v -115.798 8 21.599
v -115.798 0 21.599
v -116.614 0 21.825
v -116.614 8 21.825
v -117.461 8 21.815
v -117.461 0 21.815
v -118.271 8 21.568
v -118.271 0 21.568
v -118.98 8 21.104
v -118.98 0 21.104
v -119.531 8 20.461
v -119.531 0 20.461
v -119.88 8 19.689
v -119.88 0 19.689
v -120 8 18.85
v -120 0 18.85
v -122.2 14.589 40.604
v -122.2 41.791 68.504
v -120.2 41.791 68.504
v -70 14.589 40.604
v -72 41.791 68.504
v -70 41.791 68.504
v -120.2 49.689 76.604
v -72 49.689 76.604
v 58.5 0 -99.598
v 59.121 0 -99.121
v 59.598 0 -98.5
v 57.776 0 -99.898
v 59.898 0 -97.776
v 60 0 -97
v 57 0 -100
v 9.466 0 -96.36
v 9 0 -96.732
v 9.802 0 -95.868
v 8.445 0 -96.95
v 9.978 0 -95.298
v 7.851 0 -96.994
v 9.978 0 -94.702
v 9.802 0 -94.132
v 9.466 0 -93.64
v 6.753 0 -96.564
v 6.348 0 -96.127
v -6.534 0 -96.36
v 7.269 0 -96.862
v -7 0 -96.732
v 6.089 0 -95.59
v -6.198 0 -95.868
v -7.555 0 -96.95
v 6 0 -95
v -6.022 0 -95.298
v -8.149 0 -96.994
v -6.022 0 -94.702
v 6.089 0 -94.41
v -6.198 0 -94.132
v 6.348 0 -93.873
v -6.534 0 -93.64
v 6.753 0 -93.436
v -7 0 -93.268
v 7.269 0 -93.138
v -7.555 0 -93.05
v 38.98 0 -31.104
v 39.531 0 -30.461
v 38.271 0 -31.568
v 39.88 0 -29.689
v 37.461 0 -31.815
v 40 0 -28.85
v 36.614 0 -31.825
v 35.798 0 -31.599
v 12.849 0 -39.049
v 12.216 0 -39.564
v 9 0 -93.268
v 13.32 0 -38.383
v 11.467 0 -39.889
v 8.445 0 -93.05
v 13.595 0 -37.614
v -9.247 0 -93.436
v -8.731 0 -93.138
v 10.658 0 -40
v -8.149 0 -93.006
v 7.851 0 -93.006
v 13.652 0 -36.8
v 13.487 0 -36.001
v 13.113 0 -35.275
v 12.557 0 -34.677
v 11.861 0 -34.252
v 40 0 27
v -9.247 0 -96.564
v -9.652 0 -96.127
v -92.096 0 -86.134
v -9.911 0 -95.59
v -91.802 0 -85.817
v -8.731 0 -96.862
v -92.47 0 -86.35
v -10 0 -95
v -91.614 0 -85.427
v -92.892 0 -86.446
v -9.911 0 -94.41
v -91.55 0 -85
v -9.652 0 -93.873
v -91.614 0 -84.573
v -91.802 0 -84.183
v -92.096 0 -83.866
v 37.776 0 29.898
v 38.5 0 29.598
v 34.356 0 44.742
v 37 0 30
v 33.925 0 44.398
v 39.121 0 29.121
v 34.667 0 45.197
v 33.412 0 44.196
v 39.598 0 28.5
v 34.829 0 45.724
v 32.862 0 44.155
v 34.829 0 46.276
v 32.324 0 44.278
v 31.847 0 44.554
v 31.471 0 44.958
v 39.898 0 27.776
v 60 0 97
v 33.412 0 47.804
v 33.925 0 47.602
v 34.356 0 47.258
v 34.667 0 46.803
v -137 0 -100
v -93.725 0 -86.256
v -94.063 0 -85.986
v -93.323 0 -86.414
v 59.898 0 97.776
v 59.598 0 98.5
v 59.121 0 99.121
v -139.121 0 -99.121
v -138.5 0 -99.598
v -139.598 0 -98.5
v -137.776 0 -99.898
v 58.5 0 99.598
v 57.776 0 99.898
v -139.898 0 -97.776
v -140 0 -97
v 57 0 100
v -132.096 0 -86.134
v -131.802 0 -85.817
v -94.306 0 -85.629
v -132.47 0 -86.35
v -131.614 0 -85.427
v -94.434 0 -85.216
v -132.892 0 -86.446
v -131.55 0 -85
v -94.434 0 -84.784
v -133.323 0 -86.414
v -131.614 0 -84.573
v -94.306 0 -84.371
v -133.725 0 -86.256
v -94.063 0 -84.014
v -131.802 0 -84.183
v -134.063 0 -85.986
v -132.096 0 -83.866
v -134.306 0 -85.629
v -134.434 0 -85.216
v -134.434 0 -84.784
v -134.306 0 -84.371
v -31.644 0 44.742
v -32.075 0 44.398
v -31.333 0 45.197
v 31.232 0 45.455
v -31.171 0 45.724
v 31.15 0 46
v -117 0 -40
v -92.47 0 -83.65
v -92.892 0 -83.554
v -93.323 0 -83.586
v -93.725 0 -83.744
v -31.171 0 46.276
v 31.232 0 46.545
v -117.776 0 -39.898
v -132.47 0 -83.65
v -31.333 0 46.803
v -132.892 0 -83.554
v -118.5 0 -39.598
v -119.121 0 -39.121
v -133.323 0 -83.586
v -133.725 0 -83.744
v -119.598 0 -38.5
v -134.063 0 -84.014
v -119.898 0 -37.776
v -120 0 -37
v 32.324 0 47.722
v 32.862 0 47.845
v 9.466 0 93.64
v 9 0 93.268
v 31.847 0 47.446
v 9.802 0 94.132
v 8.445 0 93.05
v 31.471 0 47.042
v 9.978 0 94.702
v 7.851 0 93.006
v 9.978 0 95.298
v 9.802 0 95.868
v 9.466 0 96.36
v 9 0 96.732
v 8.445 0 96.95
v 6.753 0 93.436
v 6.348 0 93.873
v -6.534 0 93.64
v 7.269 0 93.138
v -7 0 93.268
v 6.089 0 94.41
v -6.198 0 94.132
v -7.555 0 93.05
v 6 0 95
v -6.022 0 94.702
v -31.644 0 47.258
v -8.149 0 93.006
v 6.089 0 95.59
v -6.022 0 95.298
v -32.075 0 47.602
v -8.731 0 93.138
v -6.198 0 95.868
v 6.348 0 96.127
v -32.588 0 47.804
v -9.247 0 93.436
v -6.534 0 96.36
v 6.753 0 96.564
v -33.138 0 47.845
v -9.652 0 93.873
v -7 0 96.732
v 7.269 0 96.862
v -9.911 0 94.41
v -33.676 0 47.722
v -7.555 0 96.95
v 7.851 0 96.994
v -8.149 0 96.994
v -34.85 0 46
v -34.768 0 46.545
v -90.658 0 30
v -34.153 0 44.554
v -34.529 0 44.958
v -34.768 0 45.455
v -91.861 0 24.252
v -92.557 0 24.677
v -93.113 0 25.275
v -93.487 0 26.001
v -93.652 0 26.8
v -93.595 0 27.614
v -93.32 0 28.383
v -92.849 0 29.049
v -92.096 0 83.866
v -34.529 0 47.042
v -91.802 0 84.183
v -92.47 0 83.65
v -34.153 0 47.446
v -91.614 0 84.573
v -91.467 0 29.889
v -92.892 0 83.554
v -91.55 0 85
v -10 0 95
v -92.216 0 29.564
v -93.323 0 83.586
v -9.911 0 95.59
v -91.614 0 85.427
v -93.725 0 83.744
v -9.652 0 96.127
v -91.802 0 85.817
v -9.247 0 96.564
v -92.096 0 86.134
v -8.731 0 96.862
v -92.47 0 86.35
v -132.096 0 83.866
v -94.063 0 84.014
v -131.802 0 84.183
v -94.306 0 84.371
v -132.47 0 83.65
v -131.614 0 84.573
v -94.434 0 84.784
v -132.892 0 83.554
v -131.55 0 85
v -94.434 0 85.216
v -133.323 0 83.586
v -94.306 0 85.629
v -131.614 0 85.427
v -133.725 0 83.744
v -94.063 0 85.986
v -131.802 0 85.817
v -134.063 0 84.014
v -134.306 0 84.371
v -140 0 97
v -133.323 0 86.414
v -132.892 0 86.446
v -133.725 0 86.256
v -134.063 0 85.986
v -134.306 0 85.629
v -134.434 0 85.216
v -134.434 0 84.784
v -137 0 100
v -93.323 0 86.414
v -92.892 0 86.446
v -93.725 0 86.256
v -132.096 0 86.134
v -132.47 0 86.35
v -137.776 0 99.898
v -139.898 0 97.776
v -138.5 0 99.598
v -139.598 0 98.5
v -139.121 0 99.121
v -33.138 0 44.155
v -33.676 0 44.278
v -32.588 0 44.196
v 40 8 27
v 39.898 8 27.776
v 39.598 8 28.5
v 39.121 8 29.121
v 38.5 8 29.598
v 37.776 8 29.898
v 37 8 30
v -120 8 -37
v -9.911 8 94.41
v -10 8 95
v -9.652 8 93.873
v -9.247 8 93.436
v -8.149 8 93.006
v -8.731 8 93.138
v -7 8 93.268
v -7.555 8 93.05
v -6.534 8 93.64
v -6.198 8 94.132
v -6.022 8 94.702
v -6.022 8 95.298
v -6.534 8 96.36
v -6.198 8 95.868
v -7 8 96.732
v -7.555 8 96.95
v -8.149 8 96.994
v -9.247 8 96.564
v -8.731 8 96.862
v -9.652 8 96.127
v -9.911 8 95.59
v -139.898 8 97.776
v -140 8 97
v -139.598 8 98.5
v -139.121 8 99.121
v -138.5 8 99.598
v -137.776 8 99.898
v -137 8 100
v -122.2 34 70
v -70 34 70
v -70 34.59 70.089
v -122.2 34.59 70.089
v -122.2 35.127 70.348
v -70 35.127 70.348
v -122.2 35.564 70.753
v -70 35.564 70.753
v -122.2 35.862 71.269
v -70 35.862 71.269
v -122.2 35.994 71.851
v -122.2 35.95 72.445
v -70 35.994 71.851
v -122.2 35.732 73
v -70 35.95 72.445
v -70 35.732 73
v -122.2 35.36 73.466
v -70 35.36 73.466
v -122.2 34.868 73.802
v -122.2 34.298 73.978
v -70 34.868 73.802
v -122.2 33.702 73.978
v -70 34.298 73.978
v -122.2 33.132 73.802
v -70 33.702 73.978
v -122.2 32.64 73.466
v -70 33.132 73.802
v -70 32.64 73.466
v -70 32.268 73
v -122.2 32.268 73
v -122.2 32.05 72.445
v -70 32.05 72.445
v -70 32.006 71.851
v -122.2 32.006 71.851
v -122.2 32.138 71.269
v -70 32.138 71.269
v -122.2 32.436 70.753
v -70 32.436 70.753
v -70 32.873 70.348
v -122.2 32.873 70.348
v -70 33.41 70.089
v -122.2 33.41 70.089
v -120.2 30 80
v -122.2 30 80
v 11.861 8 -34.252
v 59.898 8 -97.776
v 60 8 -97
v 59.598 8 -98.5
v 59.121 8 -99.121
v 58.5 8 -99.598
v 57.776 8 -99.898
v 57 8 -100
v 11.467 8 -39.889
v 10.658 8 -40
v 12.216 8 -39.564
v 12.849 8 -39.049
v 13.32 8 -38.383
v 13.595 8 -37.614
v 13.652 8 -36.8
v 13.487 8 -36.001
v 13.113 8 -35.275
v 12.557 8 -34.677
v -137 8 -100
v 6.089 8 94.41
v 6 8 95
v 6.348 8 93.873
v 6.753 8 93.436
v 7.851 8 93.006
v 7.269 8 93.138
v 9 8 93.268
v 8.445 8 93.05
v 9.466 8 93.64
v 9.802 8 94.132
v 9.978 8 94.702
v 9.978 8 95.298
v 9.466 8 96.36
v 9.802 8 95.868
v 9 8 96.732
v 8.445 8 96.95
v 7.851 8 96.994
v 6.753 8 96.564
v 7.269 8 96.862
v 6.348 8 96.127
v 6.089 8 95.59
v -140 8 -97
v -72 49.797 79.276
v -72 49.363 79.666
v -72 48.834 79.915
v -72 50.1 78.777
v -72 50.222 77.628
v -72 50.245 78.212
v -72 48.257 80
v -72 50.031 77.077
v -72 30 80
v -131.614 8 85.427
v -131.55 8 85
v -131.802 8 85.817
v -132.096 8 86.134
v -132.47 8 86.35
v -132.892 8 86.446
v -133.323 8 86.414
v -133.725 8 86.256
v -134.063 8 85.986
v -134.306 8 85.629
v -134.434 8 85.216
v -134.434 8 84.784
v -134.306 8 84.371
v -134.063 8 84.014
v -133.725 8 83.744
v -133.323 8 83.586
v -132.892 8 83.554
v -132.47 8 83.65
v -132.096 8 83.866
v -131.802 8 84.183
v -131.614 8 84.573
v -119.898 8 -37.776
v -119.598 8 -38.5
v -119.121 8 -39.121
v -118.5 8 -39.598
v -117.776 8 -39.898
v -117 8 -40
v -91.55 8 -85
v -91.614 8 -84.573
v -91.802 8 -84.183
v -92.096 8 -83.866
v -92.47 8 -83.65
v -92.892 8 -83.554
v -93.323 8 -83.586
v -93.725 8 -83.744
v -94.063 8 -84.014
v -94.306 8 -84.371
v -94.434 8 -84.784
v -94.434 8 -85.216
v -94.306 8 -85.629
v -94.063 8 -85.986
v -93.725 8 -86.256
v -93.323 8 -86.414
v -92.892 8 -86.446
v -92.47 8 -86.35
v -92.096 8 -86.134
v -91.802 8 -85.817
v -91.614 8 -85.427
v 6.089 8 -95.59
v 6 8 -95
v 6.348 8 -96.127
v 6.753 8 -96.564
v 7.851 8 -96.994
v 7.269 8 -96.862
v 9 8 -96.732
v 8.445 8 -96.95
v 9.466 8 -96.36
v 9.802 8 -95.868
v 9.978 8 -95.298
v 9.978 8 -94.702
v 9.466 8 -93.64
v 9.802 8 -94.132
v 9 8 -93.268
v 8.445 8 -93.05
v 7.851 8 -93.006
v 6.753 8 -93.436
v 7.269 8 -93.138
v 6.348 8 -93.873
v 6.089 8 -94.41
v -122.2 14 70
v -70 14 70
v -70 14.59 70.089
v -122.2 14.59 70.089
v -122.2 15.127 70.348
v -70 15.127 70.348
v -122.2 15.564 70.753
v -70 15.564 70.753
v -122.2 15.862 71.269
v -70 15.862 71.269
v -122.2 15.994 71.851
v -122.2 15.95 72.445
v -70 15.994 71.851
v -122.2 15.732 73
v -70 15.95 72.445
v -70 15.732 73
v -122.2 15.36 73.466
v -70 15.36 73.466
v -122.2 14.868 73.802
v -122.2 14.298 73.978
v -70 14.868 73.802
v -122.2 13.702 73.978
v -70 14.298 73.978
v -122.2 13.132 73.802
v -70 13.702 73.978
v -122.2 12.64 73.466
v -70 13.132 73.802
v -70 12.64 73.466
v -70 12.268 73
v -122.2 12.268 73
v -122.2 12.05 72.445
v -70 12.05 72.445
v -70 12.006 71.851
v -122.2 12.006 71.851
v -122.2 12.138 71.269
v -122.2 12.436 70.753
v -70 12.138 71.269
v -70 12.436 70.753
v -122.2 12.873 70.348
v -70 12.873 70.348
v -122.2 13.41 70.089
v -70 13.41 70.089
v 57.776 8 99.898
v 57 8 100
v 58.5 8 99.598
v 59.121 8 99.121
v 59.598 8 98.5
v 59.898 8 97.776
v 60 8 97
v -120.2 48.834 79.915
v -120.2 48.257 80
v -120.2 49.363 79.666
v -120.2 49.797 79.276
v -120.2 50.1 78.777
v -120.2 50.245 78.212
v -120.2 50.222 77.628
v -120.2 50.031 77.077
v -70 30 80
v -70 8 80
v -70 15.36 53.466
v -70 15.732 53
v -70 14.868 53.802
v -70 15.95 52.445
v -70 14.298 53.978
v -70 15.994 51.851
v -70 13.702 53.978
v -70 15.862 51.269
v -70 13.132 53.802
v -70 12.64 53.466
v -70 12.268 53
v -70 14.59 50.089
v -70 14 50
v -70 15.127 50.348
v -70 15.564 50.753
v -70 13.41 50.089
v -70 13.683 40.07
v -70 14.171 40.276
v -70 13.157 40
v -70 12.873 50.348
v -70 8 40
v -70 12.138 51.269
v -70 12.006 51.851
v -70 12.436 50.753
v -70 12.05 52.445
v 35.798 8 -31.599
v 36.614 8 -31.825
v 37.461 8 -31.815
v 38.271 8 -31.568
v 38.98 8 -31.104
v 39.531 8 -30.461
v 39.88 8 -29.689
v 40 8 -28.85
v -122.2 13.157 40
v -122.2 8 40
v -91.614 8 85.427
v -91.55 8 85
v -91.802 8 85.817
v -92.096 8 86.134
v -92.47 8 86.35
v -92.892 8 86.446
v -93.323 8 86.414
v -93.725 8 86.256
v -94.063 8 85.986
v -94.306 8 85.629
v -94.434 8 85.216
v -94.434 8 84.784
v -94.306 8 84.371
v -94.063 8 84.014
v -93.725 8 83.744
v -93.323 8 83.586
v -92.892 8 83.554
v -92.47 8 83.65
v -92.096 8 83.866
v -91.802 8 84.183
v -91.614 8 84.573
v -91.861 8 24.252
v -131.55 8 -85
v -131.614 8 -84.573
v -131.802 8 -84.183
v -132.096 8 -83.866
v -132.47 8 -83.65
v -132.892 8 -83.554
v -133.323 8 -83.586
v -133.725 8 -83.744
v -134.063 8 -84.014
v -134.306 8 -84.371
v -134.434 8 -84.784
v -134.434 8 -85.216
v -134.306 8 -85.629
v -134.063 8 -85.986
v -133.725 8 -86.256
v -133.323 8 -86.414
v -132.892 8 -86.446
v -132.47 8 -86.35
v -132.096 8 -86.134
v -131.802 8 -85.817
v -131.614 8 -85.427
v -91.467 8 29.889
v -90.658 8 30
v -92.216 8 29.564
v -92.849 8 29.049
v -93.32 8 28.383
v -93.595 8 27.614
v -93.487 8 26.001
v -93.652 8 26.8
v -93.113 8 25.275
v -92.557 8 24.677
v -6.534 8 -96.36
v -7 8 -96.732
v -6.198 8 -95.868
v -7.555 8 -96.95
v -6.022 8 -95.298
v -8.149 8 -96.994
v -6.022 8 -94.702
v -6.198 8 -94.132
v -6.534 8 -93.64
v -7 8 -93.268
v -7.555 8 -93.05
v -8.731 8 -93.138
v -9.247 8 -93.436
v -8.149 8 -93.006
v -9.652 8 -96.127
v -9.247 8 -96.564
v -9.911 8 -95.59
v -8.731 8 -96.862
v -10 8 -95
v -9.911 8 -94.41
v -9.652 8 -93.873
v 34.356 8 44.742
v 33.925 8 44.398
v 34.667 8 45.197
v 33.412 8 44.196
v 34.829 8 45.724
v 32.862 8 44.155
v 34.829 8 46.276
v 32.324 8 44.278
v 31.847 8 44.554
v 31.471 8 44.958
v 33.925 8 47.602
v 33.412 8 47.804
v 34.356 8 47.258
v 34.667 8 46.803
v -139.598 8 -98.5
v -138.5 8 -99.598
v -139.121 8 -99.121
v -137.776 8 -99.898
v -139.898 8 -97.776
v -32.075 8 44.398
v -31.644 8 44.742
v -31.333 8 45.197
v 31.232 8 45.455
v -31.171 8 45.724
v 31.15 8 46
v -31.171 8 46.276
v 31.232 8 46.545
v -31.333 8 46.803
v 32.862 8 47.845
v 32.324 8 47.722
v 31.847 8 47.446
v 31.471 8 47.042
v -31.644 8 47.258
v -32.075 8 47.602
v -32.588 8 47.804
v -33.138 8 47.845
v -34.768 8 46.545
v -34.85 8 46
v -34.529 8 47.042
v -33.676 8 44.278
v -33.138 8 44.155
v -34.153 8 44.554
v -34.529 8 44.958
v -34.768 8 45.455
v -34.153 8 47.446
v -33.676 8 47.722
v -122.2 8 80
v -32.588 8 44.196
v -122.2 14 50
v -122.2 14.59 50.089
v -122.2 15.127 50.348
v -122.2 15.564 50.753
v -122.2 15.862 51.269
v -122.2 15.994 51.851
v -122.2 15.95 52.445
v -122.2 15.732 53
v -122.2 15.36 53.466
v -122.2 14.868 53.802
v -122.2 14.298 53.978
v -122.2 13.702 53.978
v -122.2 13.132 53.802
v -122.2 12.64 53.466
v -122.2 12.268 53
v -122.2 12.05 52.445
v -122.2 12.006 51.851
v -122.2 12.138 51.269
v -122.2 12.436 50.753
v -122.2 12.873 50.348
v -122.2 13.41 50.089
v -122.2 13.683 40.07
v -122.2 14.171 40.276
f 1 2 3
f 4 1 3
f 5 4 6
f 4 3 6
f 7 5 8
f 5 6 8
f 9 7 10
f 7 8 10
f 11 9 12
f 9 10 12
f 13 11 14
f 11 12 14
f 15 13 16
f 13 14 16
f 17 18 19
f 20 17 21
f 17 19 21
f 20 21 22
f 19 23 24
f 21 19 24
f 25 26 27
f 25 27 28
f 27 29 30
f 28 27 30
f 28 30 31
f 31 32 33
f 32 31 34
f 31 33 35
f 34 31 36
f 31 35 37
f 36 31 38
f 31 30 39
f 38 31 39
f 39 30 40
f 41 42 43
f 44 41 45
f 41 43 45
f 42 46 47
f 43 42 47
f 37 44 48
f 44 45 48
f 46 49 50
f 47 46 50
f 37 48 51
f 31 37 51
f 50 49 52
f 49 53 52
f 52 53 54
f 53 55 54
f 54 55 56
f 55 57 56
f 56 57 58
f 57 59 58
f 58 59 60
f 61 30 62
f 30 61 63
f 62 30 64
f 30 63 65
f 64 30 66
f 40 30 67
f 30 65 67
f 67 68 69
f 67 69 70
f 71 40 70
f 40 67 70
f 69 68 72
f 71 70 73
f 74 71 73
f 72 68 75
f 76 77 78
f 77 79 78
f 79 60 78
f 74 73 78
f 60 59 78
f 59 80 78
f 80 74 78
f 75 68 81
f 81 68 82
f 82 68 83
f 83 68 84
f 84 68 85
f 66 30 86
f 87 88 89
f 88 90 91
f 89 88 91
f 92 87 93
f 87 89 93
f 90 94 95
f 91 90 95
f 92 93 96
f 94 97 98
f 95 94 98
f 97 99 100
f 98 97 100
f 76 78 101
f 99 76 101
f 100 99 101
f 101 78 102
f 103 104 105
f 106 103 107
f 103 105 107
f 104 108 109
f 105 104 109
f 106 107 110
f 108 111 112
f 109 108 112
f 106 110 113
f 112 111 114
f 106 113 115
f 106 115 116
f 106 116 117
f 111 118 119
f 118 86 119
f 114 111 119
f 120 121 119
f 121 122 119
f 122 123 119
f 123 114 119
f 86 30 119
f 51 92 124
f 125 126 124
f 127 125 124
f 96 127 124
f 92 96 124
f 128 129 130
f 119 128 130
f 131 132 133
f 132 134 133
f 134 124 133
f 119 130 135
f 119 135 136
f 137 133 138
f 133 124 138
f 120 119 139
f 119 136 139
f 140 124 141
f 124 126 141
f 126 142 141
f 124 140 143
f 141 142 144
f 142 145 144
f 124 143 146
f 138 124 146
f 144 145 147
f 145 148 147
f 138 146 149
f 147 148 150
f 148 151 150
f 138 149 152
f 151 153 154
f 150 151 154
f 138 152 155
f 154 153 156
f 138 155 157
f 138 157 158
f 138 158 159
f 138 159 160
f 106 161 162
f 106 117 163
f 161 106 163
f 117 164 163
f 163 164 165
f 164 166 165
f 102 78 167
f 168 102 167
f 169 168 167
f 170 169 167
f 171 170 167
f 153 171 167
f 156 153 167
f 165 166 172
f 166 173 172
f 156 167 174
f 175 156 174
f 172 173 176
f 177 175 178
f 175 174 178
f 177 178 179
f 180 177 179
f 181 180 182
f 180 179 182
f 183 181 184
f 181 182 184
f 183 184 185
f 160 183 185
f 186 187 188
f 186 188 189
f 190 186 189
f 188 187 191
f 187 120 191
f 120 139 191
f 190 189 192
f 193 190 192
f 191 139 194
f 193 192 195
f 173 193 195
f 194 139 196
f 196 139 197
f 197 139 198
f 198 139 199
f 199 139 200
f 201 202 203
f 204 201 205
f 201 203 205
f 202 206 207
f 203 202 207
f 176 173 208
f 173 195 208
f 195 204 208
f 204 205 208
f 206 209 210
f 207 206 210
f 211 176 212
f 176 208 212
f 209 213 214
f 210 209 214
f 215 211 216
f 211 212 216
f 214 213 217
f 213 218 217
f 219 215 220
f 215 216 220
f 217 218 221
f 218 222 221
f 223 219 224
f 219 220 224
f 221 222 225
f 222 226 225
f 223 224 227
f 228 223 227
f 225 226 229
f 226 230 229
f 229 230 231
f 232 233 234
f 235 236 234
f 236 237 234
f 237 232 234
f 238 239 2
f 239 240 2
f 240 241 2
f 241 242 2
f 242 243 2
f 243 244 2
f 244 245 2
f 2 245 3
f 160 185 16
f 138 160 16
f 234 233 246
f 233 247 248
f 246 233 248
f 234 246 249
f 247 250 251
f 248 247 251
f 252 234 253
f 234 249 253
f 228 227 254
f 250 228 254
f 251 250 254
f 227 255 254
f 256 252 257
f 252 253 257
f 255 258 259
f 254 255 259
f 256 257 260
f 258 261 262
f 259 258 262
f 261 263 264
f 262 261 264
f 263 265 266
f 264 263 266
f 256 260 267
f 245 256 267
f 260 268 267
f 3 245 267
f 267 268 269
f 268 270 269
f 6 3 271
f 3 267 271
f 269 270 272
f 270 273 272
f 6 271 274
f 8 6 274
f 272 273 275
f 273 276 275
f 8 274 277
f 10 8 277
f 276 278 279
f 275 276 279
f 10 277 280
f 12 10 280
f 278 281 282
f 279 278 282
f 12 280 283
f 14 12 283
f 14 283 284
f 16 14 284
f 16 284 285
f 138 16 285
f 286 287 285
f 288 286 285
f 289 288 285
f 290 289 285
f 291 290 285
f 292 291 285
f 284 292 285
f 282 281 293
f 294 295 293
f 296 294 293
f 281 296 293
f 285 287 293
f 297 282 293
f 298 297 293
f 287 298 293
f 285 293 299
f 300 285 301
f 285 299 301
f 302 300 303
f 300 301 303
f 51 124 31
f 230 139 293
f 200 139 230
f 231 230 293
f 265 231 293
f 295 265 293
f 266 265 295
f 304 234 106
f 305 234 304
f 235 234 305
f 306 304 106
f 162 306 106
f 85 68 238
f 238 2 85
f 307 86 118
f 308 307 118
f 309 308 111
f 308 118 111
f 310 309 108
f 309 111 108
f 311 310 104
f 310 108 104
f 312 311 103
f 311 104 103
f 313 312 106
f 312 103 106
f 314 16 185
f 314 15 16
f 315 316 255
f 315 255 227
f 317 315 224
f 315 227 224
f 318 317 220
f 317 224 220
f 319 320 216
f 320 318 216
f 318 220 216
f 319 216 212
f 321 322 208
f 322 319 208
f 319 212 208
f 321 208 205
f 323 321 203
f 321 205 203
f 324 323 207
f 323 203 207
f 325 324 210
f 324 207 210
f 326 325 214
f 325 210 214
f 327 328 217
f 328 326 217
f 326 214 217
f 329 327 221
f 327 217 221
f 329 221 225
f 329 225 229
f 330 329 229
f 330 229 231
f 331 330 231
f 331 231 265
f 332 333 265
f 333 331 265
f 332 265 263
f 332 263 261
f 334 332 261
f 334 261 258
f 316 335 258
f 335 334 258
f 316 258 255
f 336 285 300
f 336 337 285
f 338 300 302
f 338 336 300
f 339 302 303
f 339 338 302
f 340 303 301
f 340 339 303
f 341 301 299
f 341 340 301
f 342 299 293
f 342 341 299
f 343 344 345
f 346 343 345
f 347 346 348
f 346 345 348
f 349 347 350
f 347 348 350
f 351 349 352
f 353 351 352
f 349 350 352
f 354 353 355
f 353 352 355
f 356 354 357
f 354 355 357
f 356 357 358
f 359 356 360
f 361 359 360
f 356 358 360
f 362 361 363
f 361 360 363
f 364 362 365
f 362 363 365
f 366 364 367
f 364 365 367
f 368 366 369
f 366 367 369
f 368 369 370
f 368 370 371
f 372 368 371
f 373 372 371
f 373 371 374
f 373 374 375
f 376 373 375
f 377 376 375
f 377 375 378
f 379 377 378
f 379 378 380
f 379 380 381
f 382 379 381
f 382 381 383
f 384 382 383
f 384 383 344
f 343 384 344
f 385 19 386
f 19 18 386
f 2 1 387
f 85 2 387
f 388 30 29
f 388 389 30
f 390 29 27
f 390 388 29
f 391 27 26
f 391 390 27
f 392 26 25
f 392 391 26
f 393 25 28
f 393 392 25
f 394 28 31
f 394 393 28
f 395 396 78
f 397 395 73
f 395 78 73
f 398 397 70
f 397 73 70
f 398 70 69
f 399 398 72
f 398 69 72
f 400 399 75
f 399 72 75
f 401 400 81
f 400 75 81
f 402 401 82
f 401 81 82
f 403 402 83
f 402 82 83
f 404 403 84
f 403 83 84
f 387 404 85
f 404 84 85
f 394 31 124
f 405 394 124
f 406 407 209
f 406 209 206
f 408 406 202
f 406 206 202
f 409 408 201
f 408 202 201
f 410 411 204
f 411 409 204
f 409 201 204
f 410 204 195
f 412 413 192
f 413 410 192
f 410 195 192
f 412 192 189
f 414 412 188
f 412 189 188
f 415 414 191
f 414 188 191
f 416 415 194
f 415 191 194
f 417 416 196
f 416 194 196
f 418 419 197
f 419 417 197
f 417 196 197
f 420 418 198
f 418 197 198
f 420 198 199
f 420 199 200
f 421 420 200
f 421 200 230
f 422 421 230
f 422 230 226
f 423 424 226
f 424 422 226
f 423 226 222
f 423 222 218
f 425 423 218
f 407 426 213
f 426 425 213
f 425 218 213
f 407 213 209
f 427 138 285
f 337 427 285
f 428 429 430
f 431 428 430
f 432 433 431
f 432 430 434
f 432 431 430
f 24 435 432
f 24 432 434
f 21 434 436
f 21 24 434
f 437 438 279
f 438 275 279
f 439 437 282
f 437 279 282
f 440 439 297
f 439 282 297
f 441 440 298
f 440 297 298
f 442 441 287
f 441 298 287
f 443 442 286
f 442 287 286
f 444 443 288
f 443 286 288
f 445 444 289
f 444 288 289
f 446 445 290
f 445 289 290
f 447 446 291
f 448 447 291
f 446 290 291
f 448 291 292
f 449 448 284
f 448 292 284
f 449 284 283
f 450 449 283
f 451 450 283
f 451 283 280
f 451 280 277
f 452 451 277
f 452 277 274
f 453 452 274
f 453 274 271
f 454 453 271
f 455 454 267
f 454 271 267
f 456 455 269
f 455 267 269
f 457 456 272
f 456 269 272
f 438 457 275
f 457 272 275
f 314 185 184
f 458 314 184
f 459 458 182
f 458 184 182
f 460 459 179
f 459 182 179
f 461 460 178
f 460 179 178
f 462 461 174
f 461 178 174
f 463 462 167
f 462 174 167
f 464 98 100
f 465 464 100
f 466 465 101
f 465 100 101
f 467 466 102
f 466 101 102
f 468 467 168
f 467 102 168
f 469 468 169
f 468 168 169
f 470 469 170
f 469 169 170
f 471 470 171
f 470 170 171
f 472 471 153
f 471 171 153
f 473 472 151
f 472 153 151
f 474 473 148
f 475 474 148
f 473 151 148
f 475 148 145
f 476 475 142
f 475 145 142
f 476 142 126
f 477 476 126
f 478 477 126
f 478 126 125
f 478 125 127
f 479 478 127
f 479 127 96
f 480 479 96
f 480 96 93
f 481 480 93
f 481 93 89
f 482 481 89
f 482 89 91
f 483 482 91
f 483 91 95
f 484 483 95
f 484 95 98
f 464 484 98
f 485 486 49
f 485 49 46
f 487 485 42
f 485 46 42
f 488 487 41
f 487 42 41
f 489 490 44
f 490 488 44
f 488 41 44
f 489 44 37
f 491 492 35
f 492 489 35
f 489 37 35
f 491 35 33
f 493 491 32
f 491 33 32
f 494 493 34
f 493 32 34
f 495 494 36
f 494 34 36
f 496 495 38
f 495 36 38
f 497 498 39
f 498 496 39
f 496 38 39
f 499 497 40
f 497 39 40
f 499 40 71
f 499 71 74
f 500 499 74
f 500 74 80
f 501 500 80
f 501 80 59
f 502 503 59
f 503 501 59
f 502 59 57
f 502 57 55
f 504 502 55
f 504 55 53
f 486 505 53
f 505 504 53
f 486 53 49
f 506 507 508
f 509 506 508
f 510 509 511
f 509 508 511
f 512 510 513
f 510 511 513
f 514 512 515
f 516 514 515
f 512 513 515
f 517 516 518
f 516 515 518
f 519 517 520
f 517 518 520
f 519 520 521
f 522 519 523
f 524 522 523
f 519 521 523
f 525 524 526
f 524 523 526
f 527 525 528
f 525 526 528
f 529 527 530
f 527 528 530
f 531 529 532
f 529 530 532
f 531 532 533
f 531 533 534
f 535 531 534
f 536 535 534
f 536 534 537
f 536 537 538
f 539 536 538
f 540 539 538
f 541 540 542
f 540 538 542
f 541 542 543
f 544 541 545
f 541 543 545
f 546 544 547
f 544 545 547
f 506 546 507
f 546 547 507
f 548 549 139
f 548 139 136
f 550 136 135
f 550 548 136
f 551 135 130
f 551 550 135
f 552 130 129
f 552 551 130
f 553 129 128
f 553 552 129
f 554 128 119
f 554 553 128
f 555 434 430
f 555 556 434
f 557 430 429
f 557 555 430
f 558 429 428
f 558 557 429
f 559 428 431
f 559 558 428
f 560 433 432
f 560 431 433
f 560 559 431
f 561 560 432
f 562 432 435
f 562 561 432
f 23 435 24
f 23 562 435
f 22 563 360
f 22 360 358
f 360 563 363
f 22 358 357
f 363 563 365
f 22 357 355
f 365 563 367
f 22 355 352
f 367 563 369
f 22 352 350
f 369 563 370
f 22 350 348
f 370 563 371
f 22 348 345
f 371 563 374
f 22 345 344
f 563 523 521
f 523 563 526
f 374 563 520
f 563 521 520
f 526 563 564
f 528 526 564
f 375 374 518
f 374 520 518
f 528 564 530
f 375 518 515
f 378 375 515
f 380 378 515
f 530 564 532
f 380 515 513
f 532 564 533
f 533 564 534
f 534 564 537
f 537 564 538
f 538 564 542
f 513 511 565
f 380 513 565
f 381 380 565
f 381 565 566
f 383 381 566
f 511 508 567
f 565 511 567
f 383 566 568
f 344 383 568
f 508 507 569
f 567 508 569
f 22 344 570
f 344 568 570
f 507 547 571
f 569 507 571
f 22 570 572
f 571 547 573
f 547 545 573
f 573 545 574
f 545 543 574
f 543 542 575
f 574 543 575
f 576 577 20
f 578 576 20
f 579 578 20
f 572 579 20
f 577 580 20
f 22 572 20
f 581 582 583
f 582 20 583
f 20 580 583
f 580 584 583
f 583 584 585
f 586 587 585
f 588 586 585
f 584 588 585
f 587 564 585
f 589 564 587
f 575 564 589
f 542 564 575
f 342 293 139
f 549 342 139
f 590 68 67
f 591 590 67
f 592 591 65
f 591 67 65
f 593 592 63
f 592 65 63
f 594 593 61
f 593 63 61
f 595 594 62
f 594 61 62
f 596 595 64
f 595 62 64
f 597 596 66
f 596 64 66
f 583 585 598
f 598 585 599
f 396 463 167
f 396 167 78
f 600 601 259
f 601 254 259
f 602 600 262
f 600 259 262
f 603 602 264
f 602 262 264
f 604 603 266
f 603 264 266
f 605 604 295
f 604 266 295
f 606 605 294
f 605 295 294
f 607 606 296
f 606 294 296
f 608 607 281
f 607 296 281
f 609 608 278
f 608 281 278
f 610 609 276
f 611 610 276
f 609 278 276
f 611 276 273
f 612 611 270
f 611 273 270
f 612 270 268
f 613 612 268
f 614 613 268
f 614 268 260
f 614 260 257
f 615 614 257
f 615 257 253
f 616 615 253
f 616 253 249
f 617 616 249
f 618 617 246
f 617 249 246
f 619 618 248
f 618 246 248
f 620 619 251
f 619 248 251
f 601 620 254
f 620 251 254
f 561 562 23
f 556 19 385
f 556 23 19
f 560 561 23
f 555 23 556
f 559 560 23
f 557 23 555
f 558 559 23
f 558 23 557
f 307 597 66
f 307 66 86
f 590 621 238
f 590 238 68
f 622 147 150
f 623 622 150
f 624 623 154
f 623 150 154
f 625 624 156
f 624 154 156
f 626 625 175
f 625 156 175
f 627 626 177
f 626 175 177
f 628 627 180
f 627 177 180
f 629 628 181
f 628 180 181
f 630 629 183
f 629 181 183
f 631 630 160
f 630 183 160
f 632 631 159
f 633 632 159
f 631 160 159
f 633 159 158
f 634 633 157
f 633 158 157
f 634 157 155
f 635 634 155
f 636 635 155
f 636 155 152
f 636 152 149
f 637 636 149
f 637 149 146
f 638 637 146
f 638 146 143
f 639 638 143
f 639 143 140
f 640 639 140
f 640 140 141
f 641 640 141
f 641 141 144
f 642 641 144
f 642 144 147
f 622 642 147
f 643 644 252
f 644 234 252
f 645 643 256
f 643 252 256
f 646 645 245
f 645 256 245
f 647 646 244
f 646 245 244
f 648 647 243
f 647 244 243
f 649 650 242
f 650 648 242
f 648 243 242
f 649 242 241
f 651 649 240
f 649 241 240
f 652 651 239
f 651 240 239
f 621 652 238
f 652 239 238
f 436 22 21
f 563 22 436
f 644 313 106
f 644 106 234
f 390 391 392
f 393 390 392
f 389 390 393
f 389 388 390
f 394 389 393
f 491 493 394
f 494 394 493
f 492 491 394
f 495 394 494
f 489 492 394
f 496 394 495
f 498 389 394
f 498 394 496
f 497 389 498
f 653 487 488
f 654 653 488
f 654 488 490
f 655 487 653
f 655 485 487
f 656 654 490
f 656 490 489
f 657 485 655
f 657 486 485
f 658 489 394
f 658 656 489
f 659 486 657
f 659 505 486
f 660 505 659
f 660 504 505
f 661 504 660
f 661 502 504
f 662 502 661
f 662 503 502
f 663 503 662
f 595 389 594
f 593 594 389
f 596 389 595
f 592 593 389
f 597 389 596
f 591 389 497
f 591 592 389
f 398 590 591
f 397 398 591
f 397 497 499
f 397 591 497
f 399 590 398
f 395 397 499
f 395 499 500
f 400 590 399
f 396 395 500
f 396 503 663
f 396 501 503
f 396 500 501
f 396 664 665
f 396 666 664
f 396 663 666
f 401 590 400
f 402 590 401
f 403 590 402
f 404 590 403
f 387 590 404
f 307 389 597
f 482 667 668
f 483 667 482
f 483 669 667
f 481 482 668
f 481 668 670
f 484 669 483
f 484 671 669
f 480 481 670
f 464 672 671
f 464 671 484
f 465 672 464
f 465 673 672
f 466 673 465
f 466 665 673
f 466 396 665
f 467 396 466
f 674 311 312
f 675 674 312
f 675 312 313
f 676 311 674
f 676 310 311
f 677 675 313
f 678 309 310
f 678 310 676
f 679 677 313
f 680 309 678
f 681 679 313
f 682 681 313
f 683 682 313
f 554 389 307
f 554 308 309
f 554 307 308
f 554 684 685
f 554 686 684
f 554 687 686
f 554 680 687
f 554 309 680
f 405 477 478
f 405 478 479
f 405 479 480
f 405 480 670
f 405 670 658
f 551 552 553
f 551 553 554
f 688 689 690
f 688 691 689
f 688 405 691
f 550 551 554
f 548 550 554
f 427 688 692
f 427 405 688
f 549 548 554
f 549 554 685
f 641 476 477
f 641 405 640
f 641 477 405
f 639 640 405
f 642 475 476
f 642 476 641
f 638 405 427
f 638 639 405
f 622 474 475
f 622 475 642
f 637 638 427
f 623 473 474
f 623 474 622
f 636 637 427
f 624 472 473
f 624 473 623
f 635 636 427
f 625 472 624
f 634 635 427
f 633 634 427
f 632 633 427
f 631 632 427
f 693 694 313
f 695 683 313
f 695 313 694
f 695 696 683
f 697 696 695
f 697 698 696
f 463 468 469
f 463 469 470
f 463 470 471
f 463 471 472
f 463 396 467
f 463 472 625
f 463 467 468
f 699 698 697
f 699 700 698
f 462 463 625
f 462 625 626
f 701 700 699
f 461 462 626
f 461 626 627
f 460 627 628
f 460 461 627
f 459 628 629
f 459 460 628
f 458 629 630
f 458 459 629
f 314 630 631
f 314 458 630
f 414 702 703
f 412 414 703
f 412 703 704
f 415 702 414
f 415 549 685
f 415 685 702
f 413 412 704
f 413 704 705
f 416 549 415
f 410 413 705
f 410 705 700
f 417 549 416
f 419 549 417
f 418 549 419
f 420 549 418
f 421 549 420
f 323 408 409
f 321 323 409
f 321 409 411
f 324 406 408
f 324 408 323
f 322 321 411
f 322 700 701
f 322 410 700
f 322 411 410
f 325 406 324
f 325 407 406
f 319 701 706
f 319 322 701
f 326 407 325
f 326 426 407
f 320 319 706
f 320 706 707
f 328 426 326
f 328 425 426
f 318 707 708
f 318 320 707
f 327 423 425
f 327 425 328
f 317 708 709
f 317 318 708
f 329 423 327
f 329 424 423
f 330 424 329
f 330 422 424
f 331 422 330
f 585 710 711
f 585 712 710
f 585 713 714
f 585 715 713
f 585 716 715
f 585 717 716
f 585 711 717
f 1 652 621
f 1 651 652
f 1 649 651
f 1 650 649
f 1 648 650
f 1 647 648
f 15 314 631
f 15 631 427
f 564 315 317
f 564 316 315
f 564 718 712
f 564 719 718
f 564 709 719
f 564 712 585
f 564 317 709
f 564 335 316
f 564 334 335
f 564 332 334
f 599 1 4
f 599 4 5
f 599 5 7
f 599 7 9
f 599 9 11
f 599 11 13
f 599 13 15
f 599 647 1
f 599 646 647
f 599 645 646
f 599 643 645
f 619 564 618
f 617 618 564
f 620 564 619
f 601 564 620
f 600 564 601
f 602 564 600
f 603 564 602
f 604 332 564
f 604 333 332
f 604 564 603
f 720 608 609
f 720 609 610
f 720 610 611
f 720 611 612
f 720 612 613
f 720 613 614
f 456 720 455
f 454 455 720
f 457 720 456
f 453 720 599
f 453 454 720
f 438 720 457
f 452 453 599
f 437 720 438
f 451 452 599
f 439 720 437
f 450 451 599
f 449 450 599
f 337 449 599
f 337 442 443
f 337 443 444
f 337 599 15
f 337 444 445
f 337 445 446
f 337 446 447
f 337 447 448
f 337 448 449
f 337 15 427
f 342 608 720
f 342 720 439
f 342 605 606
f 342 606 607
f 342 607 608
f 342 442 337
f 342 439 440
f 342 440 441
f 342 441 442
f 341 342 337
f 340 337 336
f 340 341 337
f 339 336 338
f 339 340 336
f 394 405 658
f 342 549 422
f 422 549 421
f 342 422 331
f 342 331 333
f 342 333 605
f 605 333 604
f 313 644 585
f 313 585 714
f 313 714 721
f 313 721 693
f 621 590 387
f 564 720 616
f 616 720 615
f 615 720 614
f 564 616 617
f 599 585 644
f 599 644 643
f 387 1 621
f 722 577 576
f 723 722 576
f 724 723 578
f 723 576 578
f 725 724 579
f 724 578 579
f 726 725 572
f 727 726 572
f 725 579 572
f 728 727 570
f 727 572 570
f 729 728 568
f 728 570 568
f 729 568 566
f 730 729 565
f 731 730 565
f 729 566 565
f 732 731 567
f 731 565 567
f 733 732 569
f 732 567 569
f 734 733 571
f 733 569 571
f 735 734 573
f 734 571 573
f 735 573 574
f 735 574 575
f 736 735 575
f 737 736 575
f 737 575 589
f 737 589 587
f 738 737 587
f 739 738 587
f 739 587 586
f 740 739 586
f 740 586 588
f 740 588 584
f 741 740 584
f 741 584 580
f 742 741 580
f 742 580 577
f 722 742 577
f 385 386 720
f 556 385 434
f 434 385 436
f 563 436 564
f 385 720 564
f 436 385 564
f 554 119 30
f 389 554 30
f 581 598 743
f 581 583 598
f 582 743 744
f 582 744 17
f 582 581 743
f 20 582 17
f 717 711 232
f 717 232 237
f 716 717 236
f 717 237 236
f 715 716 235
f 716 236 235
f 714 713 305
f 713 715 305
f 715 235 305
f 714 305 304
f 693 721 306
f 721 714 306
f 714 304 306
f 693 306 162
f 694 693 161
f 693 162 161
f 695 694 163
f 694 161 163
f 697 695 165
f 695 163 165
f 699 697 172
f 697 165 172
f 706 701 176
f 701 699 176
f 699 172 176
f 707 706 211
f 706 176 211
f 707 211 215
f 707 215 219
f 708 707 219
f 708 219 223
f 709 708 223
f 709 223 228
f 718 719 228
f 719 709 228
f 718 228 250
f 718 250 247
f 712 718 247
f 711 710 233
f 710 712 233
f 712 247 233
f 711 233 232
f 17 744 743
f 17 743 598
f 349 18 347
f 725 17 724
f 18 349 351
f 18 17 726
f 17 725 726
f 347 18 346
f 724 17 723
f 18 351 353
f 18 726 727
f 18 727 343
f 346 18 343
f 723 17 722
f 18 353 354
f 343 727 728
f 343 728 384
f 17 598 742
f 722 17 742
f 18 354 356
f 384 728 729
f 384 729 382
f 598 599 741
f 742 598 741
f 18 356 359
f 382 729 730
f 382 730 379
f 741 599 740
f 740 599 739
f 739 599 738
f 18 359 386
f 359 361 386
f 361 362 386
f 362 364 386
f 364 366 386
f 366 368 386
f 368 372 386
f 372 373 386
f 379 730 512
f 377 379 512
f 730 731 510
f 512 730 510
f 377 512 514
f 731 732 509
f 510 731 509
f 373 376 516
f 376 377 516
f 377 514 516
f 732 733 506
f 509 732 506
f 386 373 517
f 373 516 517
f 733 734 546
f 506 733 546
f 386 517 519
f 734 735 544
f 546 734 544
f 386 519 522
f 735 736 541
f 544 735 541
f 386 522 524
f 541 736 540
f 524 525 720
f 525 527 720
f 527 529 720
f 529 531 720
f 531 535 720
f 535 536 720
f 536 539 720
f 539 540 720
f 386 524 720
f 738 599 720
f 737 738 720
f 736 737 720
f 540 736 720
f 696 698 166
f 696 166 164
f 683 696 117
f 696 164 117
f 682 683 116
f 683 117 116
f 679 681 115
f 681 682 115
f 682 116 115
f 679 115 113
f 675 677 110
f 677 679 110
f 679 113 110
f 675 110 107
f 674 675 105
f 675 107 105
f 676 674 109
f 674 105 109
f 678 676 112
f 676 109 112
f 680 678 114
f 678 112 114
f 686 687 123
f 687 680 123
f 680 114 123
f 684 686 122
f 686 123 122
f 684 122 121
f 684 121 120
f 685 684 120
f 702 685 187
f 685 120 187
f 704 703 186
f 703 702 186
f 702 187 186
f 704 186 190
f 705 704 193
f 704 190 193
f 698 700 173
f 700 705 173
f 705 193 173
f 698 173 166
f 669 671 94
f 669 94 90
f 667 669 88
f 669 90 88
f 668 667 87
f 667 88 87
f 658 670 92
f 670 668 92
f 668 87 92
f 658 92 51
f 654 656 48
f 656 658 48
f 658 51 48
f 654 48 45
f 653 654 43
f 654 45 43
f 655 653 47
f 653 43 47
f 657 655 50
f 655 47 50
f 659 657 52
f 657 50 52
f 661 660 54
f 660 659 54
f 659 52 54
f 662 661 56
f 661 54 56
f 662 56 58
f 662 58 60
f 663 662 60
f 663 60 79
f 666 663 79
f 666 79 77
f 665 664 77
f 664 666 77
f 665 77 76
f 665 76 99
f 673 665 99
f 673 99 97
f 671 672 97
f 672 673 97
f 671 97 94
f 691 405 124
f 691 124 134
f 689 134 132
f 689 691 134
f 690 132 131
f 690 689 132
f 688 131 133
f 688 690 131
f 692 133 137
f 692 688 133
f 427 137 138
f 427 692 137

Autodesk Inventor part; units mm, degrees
ref_plane "YZ Plane" through (0, 0, 0) normal (1, 0, 0) x (0, 1, 0)
ref_plane "XZ Plane" through (0, 0, 0) normal (0, 1, 0) x (-1, 0, 0)
ref_plane "XY Plane" through (0, 0, 0) normal (0, 0, 1) x (1, 0, 0)
sketch "Sketch1" plane through (0, 0, 0) normal (0, 1, 0) x (-1, 0, 0)
  line L0 (140, 100) -> (-60, 100)
  line L1 (-60, 100) -> (-60, -100)
  line L2 (-60, -100) -> (140, -100)
  line L3 (140, -100) -> (140, 100)
  line L4 (180, 0) -> (-100, 0) construction
  circle A0 centre (8, 95) radius 2
  circle A1 centre (-8, 95) radius 2
  line L5 (8, 95) -> (-8, 95) construction
  line L6 (0, -140) -> (0, 140) construction
  circle A2 centre (8, -95) radius 2
  circle A3 centre (-8, -95) radius 2
  circle A4 centre (-33, 46) radius 1.85
  circle A5 centre (33, 46) radius 1.85
  line L7 (33, 46) -> (-33, 46) construction
  point P0 (0, 0)
  point P1 (0, 95)
  point P2 (0, 46)
  dimension "d0" = 200
  dimension "d1" = 200
  dimension "d2" = 60
  dimension "d3" = 4
  dimension "d4" = 16
  dimension "d6" = 5
  dimension "d9" = 3.7
  dimension "d10" = 66
  dimension "d11" = 46
extrude "Extrusion1" add sketch "Sketch1" along normal blind 8
sketch "Sketch2" plane through (0, 8, 0) normal (0, 1, 0) x (1, 0, 0)
  line L0 (-122.2, -80) -> (-70, -80)
  line L1 (-70, -80) -> (-70, -40)
  line L2 (-70, -40) -> (-122.2, -40)
  line L3 (-122.2, -40) -> (-122.2, -80)
  line L4 (-140, -100) -> (60, -100) construction
  point P0 (0, 0)
  dimension "d12" = 52.2
  dimension "d13" = 40
  dimension "d14" = 70
  dimension "d15" = 20
extrude "Extrusion2" add sketch "Sketch2" along normal blind 45
chamfer "Chamfer1" distance 39 distance2 40 1 edges at (-96.1, 53, 40) measured on face at (-87.4, 38, 40)
fillet "Fillet1" radius 2 3 edges at (-96.1, 53, 79.9999) (-96.1, 53, 80) (-96.1, 14.0001, 40)
sketch "Sketch3" plane through (-70, 8, 80) normal (1, 0, 0) x (0, 0, -1)
  line L0 (40, 0) -> (0, 0) construction
  line L1 (0, 0) -> (0, 40.2567) construction
  circle A0 centre (8, 6) radius 2
  circle A1 centre (28, 6) radius 2
  circle A2 centre (8, 26) radius 2
  line L2 (8, 6) -> (28, 6) construction
  line L3 (8, 6) -> (8, 26) construction
  point P0 (80, -8)
  dimension "d22" = 4
  dimension "d23" = 20
  dimension "d24" = 20
  dimension "d25" = 8
  dimension "d26" = 6
extrude "Extrusion3" cut sketch "Sketch3" against normal up to surface (52.2 mm away)
sketch "Sketch6" plane through (-70, 8, 80) normal (1, 0, 0) x (0, 0, -1)
  line L0 (0, 0) -> (0, 40.2567) projected
  arc A0 (3.3962, 41.6887) -> (0, 40.2567) centre (2, 40.2567) ccw projected
  line L1 (3.3962, 41.6887) -> (39.3962, 6.5887) projected
  line L2 (11.4963, 33.7911) -> (0, 22)
  point P0 (80, -8)
  dimension "d45" = 22
extrude "Extrusion6" cut sketch "Sketch6" against normal blind 2
sketch "Sketch7" plane through (-122.2, 8, 40) normal (-1, 0, 0) x (0, 0, 1)
  line L0 (28.5037, 33.7911) -> (40, 22) projected
  line L1 (40, 0) -> (40, 40.2567) projected
  arc A0 (40, 40.2567) -> (36.6038, 41.6887) centre (38, 40.2567) ccw projected
  line L2 (36.6038, 41.6887) -> (0.6038, 6.5887) projected
  point P0 (-40, -8)
extrude "Extrusion7" cut sketch "Sketch7" against normal blind 2
sketch "Sketch4" plane through (0, 0, 0) normal (0, -1, 0) x (1, 0, 0)
  circle A0 centre (-133, 85) radius 1.45
  circle A1 centre (-93, 85) radius 1.45
  line L0 (-133, 85) -> (-93, 85) construction
  line L1 (-113, 85) -> (-113, -85) construction
  line L2 (-133, -85) -> (-93, -85) construction
  circle A2 centre (-133, -85) radius 1.45
  circle A3 centre (-93, -85) radius 1.45
  line L3 (-180, 0) -> (100, 0) construction
  line L4 (-140, 100) -> (60, 100) construction
  point P0 (0, 0)
  dimension "d29" = 2.9
  dimension "d30" = 40
  dimension "d31" = 15
  dimension "d32" = 7
extrude "Extrusion4" cut sketch "Sketch4" against normal up to surface (8 mm away)
fillet "Fillet2" radius 3 4 edges at (60, 4, 100) (-140, 4, 100) (-140, 4, -100) (60, 4, -100)
sketch "Sketch5" plane through (0, 8, 0) normal (0, 1, 0) x (1, 0, 0)
  line L0 (-120, -23.4375) -> (-120, 40)
  line L1 (-120, 40) -> (25, 40)
  line L2 (40, 40) -> (-120, -30) construction
  line L3 (40, 33.4375) -> (40, -30)
  line L4 (40, -30) -> (-105, -30)
  line L5 (-105, -30) -> (40, 33.4375)
  line L6 (-120, -30) -> (-105, -30) construction
  line L7 (40, 40) -> (40, 33.4375) construction
  line L8 (-137, -100) -> (57, -100) construction
  line L9 (60, -97) -> (60, 97) construction
  line L10 (-120, -23.4375) -> (25, 40)
  line L11 (-120, -23.4375) -> (-120, -30) construction
  line L12 (25, 40) -> (40, 40) construction
  point P0 (0, 0)
  dimension "d36" = 160
  dimension "d37" = 70
  dimension "d39" = 15
  dimension "d40" = 70
  dimension "d41" = 20
extrude "Extrusion5" cut sketch "Sketch5" against normal up to surface (8 mm away)
fillet "Fillet3" radius 3 6 edges at (-105, 4, 30) (40, 4, -33.4375) (40, 4, 30) (-120, 4, 23.4375) (-120, 4, -40) (25, 4, -40)
properties part number "Chassis"
